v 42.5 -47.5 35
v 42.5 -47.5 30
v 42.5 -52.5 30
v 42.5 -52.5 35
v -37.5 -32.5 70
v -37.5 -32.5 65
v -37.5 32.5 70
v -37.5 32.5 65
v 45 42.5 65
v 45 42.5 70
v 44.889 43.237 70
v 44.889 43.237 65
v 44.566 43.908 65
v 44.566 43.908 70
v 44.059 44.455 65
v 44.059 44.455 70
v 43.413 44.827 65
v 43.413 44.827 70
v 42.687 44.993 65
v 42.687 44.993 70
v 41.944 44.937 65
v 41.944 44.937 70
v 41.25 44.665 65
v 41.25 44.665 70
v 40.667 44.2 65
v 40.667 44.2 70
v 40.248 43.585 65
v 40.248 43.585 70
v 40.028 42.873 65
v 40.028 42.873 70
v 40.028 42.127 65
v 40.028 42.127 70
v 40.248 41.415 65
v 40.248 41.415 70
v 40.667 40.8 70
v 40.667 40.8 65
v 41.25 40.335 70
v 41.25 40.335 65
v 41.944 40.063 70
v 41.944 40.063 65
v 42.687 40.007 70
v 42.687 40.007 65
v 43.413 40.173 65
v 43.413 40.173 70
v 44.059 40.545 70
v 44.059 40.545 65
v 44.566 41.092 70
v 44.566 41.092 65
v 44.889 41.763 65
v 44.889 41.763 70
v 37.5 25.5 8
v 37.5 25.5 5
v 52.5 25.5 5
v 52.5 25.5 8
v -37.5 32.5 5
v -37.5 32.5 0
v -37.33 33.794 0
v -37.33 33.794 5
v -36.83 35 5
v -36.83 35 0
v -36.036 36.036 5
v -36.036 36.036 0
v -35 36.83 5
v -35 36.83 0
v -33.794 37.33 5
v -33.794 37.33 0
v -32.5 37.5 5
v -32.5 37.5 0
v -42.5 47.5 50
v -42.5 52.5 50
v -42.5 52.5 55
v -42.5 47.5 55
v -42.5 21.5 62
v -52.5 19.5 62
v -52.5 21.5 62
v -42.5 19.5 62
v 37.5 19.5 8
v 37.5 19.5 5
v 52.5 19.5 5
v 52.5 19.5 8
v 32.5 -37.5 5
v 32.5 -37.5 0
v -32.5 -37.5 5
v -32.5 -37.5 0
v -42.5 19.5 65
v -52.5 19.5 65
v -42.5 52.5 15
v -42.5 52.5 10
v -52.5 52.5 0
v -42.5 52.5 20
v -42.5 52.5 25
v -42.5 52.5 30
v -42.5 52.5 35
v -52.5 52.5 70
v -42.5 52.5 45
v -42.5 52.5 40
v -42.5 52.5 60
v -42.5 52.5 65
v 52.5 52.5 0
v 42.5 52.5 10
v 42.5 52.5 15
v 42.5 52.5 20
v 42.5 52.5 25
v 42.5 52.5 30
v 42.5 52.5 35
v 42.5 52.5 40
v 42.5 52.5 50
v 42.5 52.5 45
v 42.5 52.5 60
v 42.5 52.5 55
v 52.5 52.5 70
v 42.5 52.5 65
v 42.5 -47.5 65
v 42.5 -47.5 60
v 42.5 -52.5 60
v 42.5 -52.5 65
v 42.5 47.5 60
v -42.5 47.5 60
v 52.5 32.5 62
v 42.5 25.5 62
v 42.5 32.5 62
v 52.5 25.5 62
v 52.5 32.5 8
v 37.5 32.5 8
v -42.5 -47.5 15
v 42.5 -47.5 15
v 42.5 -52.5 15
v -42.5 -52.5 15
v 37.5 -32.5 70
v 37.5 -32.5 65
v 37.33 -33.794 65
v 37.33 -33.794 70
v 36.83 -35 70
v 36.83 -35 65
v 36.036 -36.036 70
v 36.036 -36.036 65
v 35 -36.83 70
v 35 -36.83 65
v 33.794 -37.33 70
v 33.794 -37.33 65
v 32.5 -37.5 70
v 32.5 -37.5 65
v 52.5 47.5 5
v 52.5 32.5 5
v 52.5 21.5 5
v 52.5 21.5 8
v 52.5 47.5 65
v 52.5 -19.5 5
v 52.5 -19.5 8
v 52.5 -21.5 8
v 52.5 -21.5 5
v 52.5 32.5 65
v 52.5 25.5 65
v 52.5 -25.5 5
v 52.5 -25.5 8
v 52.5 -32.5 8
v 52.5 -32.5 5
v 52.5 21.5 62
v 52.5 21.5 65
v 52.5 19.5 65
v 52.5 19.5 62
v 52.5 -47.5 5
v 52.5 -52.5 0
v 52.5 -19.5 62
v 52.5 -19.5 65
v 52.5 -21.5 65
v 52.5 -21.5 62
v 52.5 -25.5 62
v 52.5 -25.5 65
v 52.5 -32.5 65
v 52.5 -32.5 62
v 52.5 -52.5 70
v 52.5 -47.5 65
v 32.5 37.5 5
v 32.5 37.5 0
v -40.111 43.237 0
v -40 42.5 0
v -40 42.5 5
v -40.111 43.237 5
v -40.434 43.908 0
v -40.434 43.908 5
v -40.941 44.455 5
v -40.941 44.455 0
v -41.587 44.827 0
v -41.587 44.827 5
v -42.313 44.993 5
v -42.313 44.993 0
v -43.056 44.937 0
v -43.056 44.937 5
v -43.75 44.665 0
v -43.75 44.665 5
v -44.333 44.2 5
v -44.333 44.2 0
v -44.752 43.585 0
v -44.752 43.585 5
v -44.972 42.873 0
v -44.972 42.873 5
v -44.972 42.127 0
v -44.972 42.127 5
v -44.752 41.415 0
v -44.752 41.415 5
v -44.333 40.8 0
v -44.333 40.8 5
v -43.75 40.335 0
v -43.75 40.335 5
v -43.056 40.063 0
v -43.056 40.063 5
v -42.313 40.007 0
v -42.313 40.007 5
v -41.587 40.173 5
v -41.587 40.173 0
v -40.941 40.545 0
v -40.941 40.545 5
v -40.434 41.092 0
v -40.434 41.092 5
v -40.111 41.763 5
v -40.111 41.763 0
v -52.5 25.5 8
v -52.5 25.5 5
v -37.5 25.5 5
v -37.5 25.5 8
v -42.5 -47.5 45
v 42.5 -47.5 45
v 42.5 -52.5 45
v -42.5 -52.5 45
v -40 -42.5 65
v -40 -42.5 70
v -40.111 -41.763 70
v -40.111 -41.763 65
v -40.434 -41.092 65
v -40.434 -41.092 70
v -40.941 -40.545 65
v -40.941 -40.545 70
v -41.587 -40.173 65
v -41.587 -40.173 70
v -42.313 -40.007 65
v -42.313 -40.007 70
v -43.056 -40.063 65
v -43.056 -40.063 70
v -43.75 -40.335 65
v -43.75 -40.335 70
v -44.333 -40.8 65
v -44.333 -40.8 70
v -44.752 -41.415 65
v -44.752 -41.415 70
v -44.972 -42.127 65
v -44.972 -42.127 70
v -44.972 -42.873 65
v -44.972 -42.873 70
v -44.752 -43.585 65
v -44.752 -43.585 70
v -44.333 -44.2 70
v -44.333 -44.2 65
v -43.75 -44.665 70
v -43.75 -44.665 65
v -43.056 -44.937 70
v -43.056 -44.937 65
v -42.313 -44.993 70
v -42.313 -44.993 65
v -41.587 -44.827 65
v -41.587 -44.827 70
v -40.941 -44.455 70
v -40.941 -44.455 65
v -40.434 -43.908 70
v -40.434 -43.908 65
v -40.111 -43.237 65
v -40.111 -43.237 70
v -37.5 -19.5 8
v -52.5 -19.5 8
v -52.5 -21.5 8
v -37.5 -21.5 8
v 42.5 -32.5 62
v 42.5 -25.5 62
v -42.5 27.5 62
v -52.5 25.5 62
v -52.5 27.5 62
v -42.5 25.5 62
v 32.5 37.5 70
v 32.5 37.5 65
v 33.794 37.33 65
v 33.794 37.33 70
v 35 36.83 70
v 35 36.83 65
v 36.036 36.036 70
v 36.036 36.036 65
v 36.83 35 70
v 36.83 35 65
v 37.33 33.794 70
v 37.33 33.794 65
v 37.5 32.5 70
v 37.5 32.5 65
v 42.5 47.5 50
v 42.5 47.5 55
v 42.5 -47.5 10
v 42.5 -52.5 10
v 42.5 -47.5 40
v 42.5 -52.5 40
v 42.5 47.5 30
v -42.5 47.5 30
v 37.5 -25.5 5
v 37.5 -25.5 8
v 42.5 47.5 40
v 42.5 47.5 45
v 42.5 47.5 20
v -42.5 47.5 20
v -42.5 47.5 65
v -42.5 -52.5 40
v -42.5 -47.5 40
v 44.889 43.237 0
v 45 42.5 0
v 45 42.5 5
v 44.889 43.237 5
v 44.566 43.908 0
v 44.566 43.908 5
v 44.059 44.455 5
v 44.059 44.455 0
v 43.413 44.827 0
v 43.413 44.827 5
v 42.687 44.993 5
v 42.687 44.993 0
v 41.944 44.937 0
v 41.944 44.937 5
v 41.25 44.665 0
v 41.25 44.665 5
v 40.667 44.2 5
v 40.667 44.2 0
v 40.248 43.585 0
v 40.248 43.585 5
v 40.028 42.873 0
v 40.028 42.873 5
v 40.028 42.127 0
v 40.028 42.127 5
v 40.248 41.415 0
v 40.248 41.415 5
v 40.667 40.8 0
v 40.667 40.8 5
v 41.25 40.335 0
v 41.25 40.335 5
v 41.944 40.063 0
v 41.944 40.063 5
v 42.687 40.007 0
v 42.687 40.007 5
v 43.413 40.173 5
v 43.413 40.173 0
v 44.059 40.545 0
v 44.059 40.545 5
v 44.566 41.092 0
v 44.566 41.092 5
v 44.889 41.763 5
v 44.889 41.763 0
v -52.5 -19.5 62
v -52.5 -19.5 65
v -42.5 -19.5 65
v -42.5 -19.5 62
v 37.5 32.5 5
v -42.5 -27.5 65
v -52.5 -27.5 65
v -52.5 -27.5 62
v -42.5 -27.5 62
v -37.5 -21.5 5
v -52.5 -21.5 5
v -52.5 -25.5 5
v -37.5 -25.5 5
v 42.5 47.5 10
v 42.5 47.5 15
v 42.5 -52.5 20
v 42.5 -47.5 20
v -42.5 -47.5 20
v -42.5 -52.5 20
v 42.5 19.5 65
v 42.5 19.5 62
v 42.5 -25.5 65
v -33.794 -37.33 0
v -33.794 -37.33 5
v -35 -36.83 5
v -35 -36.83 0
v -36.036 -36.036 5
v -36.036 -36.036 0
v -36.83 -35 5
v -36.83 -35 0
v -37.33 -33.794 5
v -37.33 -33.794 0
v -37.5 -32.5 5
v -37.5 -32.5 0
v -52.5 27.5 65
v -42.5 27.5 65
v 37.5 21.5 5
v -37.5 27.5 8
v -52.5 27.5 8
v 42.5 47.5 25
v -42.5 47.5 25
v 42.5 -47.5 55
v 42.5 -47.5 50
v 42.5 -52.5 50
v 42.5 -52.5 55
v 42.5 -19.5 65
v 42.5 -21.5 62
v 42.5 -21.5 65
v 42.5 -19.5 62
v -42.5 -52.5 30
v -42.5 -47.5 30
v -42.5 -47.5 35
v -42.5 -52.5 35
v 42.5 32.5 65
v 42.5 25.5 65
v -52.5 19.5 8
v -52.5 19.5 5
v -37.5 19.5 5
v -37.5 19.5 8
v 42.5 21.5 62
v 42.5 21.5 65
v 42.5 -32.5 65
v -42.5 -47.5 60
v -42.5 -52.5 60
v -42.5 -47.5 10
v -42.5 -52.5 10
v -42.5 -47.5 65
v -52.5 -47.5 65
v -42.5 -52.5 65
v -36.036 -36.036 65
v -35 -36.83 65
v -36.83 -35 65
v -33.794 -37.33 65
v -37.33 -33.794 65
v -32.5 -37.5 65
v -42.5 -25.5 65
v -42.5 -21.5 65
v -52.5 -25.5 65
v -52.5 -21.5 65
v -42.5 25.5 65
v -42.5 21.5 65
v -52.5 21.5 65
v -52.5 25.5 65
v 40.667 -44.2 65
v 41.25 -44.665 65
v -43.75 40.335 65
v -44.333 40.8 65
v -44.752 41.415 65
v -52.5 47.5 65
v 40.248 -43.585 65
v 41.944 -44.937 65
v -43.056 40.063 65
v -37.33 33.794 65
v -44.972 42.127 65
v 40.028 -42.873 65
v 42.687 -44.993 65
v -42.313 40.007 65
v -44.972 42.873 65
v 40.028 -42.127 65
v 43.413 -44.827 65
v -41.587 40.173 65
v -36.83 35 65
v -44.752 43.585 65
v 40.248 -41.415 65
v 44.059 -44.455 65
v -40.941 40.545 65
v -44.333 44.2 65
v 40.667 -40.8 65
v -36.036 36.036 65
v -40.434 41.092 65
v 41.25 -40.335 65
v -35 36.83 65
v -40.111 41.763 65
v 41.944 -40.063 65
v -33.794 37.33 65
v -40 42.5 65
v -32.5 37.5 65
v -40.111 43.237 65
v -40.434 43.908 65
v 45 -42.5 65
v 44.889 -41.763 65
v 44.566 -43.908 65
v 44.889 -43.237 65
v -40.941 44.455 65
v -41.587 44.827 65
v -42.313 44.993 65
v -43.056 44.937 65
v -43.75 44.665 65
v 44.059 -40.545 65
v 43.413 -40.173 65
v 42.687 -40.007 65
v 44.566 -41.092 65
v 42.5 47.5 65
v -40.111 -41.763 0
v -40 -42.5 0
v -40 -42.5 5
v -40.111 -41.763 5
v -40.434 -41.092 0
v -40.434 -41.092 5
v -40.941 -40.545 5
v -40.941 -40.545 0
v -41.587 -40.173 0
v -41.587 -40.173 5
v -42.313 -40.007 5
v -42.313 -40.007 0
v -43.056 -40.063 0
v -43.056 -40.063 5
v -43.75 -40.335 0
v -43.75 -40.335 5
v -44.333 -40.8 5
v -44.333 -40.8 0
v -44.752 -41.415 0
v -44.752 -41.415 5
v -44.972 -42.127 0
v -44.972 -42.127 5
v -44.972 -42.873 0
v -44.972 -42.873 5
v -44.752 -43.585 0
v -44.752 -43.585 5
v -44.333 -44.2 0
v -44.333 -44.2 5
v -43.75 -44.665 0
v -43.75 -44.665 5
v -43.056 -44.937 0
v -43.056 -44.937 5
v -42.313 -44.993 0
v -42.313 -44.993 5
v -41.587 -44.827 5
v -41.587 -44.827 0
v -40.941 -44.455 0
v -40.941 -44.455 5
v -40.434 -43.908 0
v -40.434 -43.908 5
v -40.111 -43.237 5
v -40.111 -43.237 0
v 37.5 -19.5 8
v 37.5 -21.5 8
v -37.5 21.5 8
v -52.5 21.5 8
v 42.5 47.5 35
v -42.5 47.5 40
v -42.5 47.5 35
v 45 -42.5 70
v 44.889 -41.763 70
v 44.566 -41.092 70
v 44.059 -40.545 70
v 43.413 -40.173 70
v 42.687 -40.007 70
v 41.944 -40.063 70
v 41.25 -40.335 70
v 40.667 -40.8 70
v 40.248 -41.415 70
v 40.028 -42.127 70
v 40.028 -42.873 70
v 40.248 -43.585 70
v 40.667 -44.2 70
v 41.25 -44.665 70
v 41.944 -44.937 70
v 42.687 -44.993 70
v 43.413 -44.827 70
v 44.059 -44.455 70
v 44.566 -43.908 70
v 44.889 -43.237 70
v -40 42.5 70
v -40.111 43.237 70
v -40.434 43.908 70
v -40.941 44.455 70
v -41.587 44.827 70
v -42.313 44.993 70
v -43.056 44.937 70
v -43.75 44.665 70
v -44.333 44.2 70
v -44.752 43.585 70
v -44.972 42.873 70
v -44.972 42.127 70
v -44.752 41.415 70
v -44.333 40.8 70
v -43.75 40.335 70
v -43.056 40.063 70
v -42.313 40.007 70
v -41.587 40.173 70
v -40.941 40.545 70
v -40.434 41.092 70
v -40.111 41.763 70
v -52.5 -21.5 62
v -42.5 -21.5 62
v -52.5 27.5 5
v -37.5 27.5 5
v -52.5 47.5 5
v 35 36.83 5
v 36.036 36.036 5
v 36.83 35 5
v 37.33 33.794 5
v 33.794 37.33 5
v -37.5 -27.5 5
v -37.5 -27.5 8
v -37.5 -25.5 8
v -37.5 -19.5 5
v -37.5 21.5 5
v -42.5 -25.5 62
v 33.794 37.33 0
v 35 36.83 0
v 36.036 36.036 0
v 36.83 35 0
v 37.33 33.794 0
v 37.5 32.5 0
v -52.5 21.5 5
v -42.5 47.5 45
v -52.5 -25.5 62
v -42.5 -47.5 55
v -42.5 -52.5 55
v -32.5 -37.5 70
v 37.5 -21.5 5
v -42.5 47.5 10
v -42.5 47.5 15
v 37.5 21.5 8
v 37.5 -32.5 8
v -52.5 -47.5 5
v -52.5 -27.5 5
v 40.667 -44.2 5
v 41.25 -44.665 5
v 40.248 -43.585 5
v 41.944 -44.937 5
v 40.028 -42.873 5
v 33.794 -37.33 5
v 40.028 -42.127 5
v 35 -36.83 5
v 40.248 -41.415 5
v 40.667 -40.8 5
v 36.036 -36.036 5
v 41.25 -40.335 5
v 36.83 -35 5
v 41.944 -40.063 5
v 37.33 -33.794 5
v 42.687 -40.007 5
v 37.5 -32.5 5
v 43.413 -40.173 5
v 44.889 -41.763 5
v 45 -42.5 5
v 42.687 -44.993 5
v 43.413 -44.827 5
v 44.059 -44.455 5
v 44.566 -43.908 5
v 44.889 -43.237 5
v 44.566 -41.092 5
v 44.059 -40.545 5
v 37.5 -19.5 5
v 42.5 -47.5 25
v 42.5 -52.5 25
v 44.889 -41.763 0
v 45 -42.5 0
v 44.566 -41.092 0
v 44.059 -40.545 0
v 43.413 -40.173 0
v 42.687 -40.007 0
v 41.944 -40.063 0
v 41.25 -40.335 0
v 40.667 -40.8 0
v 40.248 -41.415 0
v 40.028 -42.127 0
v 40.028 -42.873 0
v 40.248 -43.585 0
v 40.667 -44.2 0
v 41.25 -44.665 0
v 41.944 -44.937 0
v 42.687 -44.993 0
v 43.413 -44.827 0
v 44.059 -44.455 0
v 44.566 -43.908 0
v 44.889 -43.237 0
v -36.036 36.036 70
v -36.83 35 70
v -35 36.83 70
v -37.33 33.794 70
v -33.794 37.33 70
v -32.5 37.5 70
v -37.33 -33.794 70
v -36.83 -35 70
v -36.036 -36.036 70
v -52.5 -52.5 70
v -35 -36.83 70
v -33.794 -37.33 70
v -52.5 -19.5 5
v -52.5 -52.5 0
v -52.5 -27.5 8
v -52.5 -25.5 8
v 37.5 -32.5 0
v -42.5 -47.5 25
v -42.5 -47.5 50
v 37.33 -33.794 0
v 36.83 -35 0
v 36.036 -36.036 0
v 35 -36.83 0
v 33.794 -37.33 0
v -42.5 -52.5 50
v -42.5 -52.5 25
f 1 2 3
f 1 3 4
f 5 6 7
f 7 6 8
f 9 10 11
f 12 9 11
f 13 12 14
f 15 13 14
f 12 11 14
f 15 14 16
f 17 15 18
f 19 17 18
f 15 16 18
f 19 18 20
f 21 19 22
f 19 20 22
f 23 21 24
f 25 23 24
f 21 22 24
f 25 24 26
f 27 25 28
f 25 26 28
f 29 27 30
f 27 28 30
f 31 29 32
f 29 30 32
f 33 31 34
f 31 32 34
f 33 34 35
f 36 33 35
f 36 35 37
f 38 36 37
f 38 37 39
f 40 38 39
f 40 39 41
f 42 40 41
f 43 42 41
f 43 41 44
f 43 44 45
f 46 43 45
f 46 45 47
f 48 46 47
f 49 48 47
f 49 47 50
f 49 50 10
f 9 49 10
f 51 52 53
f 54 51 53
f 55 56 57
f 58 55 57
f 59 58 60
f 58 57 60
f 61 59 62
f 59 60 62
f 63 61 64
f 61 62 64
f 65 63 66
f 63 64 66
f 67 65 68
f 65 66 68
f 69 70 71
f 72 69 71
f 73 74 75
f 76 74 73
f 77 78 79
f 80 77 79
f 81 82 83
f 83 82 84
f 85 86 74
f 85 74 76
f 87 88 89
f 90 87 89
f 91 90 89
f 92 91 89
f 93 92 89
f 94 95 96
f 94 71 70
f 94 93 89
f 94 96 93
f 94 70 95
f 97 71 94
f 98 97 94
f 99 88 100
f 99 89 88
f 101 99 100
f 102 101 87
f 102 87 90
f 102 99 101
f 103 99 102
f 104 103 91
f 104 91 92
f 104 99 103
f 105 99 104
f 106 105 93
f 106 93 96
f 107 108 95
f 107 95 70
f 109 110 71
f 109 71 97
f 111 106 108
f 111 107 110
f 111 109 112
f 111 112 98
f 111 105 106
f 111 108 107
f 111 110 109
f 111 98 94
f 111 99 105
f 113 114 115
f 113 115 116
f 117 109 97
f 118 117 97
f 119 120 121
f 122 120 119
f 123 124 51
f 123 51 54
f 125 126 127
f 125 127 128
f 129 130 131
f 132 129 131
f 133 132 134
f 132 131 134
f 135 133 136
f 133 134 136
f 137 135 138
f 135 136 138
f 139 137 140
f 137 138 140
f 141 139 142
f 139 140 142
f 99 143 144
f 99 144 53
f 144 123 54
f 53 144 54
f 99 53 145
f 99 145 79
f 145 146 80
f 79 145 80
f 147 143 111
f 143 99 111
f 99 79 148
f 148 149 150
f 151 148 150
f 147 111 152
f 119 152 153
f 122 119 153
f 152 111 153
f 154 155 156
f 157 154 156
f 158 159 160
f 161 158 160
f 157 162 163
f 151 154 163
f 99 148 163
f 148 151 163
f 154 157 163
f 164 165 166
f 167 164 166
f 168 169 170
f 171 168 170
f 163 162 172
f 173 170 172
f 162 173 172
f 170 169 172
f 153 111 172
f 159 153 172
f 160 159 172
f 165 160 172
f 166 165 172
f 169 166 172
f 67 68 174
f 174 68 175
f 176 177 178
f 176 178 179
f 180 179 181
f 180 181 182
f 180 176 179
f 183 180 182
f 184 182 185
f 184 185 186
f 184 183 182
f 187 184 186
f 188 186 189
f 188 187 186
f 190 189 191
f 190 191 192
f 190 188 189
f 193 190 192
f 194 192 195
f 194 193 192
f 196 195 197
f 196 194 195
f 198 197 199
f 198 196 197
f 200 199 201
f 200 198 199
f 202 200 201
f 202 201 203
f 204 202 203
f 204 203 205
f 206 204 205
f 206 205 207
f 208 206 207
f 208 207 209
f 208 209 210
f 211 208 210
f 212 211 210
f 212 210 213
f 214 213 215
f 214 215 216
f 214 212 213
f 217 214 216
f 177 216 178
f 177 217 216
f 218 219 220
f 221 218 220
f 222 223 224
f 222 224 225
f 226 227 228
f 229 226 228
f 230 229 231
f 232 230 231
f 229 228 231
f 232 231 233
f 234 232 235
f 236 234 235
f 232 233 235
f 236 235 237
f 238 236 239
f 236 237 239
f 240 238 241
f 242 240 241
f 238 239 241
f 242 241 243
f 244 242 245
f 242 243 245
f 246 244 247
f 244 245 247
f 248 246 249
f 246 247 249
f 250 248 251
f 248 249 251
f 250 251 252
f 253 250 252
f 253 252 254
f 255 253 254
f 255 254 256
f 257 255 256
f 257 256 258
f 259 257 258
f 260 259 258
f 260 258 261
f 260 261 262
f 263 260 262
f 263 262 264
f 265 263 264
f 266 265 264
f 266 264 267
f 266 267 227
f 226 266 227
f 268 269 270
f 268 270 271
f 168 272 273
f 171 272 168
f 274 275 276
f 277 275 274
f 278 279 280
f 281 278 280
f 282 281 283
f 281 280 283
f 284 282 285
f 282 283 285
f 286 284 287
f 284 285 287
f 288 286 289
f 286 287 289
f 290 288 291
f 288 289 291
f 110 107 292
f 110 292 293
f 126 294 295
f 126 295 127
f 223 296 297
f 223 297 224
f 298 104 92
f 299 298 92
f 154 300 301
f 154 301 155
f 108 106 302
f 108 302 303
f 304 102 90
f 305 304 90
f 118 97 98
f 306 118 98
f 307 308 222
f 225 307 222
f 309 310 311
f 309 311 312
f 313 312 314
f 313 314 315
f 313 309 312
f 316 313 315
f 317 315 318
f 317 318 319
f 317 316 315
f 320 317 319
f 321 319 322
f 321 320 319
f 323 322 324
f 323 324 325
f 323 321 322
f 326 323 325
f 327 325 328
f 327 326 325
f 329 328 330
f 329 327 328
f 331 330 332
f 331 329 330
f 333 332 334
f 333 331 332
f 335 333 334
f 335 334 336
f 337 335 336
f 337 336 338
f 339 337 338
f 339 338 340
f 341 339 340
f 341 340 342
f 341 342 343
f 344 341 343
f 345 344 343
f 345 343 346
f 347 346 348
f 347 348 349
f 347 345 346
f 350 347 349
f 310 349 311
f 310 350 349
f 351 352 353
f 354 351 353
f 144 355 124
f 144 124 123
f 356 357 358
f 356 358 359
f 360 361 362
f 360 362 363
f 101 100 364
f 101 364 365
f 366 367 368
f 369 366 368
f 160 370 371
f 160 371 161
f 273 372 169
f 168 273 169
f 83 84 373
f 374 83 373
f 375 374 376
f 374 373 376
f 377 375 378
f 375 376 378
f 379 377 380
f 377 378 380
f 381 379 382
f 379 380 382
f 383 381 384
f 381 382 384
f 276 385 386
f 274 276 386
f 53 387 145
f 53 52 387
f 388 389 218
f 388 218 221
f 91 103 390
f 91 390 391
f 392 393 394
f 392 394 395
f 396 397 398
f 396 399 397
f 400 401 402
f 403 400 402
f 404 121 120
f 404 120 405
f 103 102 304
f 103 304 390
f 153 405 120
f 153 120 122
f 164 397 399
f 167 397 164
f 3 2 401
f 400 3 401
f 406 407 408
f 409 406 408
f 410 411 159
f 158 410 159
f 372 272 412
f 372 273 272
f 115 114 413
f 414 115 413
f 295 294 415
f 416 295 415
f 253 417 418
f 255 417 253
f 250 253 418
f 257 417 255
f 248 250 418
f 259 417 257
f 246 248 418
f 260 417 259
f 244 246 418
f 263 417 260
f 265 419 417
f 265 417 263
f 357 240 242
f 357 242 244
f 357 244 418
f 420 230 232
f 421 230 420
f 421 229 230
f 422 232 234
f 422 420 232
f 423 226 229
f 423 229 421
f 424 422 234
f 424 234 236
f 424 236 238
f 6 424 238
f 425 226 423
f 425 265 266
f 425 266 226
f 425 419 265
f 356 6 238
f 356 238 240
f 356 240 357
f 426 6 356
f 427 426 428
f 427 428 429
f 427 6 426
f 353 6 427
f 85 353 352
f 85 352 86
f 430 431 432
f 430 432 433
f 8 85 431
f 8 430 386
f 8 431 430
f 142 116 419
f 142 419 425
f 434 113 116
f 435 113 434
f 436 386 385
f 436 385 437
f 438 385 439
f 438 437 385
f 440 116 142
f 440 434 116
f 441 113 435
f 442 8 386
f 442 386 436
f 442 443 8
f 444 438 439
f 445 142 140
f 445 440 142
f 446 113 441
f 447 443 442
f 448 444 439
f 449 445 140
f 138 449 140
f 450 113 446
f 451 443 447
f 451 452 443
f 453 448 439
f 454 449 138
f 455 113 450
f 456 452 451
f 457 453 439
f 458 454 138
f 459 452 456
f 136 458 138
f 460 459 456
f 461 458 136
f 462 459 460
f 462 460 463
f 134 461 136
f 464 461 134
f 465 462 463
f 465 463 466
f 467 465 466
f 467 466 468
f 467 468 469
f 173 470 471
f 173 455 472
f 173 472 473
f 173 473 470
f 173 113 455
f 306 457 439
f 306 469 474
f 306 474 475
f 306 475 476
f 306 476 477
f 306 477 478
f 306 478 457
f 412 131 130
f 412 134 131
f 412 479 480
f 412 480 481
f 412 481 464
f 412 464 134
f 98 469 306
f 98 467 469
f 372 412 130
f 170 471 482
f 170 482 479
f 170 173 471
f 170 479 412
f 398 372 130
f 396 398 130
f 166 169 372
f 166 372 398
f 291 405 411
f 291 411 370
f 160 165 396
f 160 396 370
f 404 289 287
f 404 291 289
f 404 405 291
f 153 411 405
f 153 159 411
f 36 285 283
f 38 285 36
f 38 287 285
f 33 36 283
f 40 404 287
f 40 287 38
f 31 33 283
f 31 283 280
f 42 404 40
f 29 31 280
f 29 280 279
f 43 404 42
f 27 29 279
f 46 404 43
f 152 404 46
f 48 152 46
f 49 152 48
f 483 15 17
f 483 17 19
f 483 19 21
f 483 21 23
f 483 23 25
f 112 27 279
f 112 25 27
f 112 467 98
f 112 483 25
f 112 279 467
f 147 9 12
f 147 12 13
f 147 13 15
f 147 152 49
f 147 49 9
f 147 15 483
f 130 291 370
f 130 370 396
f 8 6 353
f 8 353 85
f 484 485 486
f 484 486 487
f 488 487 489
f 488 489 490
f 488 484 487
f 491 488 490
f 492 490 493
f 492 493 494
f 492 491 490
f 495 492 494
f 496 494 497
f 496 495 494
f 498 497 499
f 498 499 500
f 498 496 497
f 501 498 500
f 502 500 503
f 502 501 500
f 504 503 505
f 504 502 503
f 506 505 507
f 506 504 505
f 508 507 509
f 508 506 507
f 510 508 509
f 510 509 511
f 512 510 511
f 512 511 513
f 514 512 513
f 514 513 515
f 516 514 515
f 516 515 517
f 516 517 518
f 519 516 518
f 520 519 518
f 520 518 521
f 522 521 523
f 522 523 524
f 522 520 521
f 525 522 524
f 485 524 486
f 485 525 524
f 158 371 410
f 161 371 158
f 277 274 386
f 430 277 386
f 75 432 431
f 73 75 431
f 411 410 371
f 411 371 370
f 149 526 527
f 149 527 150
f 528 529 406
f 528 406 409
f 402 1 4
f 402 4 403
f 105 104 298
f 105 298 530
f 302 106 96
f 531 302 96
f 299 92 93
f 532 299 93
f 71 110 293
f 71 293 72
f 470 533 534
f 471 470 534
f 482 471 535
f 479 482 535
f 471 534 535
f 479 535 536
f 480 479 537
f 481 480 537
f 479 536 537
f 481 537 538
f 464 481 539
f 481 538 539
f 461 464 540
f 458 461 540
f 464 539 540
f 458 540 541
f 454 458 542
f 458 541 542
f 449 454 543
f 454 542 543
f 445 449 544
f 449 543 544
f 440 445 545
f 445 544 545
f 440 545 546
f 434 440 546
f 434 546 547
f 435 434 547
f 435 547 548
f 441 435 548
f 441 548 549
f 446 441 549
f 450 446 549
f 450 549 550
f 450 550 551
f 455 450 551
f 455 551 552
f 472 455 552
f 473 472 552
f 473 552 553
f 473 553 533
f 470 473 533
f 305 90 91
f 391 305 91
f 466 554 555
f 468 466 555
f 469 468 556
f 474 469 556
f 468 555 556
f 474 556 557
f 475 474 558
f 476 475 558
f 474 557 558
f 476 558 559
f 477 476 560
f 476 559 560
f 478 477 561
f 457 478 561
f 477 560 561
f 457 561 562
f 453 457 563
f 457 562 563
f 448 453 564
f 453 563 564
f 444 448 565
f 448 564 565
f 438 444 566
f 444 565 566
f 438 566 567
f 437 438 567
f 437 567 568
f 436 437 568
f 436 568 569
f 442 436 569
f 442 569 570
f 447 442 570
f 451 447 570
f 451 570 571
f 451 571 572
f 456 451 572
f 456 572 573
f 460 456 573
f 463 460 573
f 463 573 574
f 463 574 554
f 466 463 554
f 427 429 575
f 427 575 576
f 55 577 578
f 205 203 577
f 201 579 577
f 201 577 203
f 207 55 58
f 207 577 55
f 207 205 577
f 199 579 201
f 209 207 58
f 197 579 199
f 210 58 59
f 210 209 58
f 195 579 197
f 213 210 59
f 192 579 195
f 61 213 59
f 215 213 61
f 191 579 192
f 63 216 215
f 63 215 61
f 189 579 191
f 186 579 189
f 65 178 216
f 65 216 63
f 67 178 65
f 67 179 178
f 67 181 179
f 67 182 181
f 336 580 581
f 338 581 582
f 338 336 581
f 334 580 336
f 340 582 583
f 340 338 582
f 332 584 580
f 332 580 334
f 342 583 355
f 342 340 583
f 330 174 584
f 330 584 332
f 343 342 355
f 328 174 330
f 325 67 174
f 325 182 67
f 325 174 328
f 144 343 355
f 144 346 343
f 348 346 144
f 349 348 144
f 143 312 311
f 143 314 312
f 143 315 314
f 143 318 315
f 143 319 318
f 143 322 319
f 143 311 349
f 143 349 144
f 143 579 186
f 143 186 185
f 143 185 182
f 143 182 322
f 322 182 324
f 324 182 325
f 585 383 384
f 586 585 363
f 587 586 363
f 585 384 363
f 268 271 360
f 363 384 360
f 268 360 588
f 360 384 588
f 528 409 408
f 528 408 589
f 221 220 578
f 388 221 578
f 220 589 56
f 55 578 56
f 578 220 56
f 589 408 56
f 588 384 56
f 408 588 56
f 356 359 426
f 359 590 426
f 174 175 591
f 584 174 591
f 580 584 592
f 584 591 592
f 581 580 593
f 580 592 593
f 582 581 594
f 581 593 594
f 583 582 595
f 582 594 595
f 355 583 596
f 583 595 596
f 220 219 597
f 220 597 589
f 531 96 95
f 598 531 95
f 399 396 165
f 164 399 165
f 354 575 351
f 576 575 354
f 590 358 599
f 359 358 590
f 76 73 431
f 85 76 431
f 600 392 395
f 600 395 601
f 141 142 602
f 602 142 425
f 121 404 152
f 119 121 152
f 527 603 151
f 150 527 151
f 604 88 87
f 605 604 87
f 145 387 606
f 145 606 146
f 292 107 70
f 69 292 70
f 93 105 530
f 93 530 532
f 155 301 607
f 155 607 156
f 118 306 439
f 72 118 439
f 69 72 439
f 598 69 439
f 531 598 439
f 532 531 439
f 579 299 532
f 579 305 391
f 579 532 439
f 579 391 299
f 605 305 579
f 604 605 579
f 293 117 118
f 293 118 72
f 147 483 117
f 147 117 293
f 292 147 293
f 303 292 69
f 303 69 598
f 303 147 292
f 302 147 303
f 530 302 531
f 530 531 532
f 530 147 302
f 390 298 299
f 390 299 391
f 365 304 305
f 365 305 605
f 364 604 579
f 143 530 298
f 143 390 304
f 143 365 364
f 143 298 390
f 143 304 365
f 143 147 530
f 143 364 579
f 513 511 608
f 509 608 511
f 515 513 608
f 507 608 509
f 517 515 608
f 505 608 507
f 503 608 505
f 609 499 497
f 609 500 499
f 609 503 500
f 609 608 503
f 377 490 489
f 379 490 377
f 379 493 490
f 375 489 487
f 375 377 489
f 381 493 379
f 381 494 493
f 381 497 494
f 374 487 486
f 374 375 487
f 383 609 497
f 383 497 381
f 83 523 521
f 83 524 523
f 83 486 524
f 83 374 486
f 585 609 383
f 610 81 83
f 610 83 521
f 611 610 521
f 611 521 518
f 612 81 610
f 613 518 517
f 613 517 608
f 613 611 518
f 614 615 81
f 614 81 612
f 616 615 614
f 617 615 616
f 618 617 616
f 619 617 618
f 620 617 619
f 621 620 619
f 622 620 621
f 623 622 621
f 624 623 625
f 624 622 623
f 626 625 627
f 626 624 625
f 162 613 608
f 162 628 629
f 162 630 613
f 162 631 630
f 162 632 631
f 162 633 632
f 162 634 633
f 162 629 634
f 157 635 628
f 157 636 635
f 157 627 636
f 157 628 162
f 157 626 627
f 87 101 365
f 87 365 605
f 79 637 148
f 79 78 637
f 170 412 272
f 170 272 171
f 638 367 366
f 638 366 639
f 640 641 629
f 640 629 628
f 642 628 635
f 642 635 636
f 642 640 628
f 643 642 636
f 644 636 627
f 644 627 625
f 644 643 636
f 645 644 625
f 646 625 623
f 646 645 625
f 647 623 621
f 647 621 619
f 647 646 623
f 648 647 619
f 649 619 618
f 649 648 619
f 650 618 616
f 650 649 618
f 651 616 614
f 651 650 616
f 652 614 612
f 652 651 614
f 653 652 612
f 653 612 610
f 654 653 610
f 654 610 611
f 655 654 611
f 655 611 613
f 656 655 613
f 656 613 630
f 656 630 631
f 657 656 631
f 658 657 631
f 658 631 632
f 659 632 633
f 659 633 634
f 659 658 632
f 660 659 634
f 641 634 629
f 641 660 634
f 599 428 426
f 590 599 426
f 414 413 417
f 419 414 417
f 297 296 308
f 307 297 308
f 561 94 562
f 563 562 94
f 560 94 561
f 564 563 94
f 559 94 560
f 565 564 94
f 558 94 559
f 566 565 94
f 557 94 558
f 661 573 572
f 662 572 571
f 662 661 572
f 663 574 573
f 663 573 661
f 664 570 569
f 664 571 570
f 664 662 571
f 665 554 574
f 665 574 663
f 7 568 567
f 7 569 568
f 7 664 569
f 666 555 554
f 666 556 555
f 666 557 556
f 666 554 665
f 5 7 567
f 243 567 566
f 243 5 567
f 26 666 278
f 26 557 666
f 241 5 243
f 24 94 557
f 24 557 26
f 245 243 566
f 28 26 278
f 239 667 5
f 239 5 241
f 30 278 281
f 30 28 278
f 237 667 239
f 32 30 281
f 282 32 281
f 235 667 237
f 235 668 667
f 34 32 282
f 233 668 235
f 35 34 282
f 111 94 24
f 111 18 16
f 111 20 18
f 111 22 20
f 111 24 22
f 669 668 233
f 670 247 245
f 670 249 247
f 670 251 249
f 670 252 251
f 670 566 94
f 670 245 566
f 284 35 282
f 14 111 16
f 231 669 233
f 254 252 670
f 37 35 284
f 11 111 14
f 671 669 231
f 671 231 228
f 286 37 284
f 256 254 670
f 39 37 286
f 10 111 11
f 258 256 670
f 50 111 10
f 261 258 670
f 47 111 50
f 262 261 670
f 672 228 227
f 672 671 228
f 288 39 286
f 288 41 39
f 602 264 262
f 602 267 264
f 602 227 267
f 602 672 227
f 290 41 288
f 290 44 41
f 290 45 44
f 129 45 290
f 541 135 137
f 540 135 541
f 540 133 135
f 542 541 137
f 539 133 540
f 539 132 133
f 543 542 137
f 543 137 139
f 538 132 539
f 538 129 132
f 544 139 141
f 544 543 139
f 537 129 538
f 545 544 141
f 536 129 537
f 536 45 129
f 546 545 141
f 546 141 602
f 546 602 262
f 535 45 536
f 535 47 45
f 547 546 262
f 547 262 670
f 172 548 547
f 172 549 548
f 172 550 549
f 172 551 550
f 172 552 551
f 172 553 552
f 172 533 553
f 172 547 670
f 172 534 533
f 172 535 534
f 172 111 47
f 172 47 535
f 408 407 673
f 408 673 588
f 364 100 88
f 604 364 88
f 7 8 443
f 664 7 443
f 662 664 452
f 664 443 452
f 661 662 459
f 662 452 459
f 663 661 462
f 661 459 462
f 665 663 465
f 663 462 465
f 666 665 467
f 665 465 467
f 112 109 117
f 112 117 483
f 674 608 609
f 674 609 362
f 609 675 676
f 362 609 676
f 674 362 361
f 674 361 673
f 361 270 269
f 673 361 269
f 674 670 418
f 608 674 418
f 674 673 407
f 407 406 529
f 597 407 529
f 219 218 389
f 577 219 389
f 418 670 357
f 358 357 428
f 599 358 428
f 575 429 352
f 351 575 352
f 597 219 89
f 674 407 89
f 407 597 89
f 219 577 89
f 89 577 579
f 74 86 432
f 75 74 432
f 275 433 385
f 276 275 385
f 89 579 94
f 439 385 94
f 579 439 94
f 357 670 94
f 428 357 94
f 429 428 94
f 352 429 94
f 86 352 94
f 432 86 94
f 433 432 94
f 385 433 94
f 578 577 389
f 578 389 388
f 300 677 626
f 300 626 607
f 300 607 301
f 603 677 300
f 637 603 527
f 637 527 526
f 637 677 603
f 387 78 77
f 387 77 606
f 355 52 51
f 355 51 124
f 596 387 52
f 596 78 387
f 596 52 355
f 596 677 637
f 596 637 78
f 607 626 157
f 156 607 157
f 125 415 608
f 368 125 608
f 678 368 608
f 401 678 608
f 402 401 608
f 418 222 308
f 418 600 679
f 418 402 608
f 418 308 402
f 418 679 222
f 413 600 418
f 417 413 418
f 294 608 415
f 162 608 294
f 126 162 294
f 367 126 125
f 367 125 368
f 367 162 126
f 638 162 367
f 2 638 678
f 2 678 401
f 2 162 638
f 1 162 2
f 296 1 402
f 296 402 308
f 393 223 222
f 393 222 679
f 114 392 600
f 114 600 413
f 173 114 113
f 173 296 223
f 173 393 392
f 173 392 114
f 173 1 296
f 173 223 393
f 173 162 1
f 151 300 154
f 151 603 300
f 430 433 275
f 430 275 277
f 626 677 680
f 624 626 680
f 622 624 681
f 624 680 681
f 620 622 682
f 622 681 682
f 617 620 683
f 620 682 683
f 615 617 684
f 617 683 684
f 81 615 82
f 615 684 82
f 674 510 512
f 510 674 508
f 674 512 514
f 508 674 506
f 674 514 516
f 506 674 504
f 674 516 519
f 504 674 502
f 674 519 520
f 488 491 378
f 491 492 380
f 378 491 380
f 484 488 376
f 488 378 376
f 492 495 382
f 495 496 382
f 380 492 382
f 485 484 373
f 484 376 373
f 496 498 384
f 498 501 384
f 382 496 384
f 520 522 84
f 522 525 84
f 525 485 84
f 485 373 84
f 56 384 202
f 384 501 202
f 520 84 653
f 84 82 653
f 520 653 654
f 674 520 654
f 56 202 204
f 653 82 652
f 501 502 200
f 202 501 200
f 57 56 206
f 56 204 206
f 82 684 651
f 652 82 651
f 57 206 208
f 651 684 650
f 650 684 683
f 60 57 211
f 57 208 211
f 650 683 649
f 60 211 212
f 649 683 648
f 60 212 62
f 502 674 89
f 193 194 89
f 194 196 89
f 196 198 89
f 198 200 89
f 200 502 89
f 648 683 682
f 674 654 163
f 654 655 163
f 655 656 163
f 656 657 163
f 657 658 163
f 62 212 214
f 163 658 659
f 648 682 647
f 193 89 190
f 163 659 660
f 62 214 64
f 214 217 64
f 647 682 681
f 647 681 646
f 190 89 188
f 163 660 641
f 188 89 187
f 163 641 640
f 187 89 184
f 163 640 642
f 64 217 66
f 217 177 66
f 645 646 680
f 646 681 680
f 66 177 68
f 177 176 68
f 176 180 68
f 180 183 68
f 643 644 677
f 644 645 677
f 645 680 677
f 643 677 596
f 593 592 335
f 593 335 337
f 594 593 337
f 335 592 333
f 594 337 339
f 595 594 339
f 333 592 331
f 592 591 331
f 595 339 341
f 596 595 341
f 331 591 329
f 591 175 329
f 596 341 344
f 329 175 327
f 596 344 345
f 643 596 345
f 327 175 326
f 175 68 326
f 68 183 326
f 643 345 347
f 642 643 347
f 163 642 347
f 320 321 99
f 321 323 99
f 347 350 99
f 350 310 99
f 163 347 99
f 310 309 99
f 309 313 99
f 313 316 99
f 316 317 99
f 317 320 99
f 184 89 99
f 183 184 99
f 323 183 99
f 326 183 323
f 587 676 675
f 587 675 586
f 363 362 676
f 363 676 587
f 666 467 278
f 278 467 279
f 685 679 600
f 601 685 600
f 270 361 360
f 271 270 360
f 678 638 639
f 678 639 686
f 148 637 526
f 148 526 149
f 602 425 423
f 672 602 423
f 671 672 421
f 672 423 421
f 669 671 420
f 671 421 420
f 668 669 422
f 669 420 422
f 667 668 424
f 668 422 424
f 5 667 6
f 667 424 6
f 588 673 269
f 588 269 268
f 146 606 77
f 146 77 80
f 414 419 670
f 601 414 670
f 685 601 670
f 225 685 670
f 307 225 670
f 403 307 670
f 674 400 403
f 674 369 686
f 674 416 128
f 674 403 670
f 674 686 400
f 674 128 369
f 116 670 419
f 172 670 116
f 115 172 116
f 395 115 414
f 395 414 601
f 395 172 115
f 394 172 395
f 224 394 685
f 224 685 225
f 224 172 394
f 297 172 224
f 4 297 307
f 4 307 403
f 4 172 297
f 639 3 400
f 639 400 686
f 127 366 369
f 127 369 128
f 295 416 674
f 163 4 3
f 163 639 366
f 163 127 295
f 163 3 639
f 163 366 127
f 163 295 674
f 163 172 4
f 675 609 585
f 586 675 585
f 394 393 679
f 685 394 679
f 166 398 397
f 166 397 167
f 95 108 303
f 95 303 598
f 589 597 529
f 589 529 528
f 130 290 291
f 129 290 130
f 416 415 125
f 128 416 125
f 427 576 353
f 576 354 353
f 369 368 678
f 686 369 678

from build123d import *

# Parameters (mm, degrees)
F0_W          = 105
F0_H          = 105
F0_R          = 2.5
F1_DEPTH      = 5
F2_W          = 15
F2_H          = 2
F2_H_2        = 7
F3_DEPTH      = 3
F5_DEPTH      = 52.5
F5_DEPTH_BACK = 52.5
F7_DEPTH      = 5
F8_W          = 15
F8_H          = 2
F8_H_2        = 7
F9_DEPTH      = 3
F10_W         = 85
F10_H         = 5
F11_DEPTH     = 105.001
F12_R         = 2.5
F13_DEPTH     = 25


with BuildPart() as f1:
    # F0 (on Top) → F1 (new body)
    with BuildSketch(Plane.XY):
        Rectangle(F0_W, F0_H)
        with Locations((-42.5, -42.5)):
            Circle(F0_R, mode=Mode.SUBTRACT)
        with Locations((42.5, -42.5)):
            Circle(F0_R, mode=Mode.SUBTRACT)
        with Locations((-42.5, 42.5)):
            Circle(F0_R, mode=Mode.SUBTRACT)
        with BuildLine():
            ThreePointArc((-37.5, 32.5), (-36.035534, 36.035534), (-32.5, 37.5))
            Line((-32.5, 37.5), (32.5, 37.5))
            ThreePointArc((32.5, 37.5), (36.035534, 36.035534), (37.5, 32.5))
            Line((37.5, 32.5), (37.5, -32.5))
            ThreePointArc((37.5, -32.5), (36.035534, -36.035534), (32.5, -37.5))
            Line((32.5, -37.5), (-32.5, -37.5))
            ThreePointArc((-32.5, -37.5), (-36.035534, -36.035534), (-37.5, -32.5))
            Line((-37.5, -32.5), (-37.5, 32.5))
        make_face(mode=Mode.SUBTRACT)
        with Locations((42.5, 42.5)):
            Circle(F0_R, mode=Mode.SUBTRACT)
    extrude(amount=F1_DEPTH)

    # F2 (on face) → F3 (join)
    with BuildSketch(Plane.XY.offset(5)):
        with Locations((-45, 26.5)):
            Rectangle(F2_W, F2_H)
        with Locations((-45, 20.5)):
            Rectangle(F2_W, F2_H)
        with Locations((45, 20.5)):
            Rectangle(F2_W, F2_H)
        with Locations((45, 29)):
            Rectangle(F2_W, F2_H_2)
        with Locations((45, -20.5)):
            Rectangle(F2_W, F2_H)
        with Locations((45, -29)):
            Rectangle(F2_W, F2_H_2)
        with Locations((-45, -26.5)):
            Rectangle(F2_W, F2_H)
        with Locations((-45, -20.5)):
            Rectangle(F2_W, F2_H)
    extrude(amount=F3_DEPTH)

    # F4 (on Right) → F5 (join, two sides)
    with BuildSketch(Plane.YZ) as f5_sk:
        Polygon((47.5, 5), (52.5, 5), (52.5, 70), (-52.5, 70), (-52.5, 5), (-47.5, 5), (-47.5, 65), (47.5, 65), align=None)
    extrude(amount=F5_DEPTH)
    extrude(f5_sk.sketch, amount=-F5_DEPTH_BACK)

    # F6 (on face) → F7 (cut, through all)
    with BuildSketch(Plane(origin=(0, 0, 65), x_dir=(1, 0, 0), z_dir=(0, 0, -1))):
        with BuildLine():
            ThreePointArc((-37.5, -32.5), (-36.035534, -36.035534), (-32.5, -37.5))
            Line((-32.5, -37.5), (32.5, -37.5))
            ThreePointArc((32.5, -37.5), (36.035534, -36.035534), (37.5, -32.5))
            Line((37.5, -32.5), (37.5, 32.5))
            ThreePointArc((37.5, 32.5), (36.035534, 36.035534), (32.5, 37.5))
            Line((32.5, 37.5), (-32.5, 37.5))
            ThreePointArc((-32.5, 37.5), (-36.035534, 36.035534), (-37.5, 32.5))
            Line((-37.5, 32.5), (-37.5, -32.5))
        make_face()
    extrude(amount=-F7_DEPTH, mode=Mode.SUBTRACT)

    # F8 (on face) → F9 (join)
    with BuildSketch(Plane(origin=(0, 0, 65), x_dir=(1, 0, 0), z_dir=(0, 0, -1))):
        with Locations((-45, -26.5)):
            Rectangle(F8_W, F8_H)
        with Locations((-45, -20.5)):
            Rectangle(F8_W, F8_H)
        with Locations((-45, 20.5)):
            Rectangle(F8_W, F8_H)
        with Locations((-45, 26.5)):
            Rectangle(F8_W, F8_H)
        with Locations((45, 29)):
            Rectangle(F8_W, F8_H_2)
        with Locations((45, 20.5)):
            Rectangle(F8_W, F8_H)
        with Locations((45, -29)):
            Rectangle(F8_W, F8_H_2)
        with Locations((45, -20.5)):
            Rectangle(F8_W, F8_H)
    extrude(amount=F9_DEPTH)

    # F10 (on face) → F11 (cut, through all)
    with BuildSketch(Plane(origin=(0, 52.5, 0), x_dir=(-1, 0, 0), z_dir=(0, 1, 0))):
        with Locations((0, 12.5)):
            Rectangle(F10_W, F10_H)
        with Locations((0, 22.5)):
            Rectangle(F10_W, F10_H)
        with Locations((0, 32.5)):
            Rectangle(F10_W, F10_H)
        with Locations((0, 42.5)):
            Rectangle(F10_W, F10_H)
        with Locations((0, 52.5)):
            Rectangle(F10_W, F10_H)
        with Locations((0, 62.5)):
            Rectangle(F10_W, F10_H)
    extrude(amount=-F11_DEPTH, mode=Mode.SUBTRACT)

    # F12 (on face) → F13 (cut)
    with BuildSketch(Plane.XY.offset(70)):
        with Locations((42.5, -42.5)):
            Circle(F12_R)
        with Locations((-42.5, -42.5)):
            Circle(F12_R)
        with Locations((-42.5, 42.5)):
            Circle(F12_R)
        with Locations((42.5, 42.5)):
            Circle(F12_R)
    extrude(amount=-F13_DEPTH, mode=Mode.SUBTRACT)


solid = f1.part
